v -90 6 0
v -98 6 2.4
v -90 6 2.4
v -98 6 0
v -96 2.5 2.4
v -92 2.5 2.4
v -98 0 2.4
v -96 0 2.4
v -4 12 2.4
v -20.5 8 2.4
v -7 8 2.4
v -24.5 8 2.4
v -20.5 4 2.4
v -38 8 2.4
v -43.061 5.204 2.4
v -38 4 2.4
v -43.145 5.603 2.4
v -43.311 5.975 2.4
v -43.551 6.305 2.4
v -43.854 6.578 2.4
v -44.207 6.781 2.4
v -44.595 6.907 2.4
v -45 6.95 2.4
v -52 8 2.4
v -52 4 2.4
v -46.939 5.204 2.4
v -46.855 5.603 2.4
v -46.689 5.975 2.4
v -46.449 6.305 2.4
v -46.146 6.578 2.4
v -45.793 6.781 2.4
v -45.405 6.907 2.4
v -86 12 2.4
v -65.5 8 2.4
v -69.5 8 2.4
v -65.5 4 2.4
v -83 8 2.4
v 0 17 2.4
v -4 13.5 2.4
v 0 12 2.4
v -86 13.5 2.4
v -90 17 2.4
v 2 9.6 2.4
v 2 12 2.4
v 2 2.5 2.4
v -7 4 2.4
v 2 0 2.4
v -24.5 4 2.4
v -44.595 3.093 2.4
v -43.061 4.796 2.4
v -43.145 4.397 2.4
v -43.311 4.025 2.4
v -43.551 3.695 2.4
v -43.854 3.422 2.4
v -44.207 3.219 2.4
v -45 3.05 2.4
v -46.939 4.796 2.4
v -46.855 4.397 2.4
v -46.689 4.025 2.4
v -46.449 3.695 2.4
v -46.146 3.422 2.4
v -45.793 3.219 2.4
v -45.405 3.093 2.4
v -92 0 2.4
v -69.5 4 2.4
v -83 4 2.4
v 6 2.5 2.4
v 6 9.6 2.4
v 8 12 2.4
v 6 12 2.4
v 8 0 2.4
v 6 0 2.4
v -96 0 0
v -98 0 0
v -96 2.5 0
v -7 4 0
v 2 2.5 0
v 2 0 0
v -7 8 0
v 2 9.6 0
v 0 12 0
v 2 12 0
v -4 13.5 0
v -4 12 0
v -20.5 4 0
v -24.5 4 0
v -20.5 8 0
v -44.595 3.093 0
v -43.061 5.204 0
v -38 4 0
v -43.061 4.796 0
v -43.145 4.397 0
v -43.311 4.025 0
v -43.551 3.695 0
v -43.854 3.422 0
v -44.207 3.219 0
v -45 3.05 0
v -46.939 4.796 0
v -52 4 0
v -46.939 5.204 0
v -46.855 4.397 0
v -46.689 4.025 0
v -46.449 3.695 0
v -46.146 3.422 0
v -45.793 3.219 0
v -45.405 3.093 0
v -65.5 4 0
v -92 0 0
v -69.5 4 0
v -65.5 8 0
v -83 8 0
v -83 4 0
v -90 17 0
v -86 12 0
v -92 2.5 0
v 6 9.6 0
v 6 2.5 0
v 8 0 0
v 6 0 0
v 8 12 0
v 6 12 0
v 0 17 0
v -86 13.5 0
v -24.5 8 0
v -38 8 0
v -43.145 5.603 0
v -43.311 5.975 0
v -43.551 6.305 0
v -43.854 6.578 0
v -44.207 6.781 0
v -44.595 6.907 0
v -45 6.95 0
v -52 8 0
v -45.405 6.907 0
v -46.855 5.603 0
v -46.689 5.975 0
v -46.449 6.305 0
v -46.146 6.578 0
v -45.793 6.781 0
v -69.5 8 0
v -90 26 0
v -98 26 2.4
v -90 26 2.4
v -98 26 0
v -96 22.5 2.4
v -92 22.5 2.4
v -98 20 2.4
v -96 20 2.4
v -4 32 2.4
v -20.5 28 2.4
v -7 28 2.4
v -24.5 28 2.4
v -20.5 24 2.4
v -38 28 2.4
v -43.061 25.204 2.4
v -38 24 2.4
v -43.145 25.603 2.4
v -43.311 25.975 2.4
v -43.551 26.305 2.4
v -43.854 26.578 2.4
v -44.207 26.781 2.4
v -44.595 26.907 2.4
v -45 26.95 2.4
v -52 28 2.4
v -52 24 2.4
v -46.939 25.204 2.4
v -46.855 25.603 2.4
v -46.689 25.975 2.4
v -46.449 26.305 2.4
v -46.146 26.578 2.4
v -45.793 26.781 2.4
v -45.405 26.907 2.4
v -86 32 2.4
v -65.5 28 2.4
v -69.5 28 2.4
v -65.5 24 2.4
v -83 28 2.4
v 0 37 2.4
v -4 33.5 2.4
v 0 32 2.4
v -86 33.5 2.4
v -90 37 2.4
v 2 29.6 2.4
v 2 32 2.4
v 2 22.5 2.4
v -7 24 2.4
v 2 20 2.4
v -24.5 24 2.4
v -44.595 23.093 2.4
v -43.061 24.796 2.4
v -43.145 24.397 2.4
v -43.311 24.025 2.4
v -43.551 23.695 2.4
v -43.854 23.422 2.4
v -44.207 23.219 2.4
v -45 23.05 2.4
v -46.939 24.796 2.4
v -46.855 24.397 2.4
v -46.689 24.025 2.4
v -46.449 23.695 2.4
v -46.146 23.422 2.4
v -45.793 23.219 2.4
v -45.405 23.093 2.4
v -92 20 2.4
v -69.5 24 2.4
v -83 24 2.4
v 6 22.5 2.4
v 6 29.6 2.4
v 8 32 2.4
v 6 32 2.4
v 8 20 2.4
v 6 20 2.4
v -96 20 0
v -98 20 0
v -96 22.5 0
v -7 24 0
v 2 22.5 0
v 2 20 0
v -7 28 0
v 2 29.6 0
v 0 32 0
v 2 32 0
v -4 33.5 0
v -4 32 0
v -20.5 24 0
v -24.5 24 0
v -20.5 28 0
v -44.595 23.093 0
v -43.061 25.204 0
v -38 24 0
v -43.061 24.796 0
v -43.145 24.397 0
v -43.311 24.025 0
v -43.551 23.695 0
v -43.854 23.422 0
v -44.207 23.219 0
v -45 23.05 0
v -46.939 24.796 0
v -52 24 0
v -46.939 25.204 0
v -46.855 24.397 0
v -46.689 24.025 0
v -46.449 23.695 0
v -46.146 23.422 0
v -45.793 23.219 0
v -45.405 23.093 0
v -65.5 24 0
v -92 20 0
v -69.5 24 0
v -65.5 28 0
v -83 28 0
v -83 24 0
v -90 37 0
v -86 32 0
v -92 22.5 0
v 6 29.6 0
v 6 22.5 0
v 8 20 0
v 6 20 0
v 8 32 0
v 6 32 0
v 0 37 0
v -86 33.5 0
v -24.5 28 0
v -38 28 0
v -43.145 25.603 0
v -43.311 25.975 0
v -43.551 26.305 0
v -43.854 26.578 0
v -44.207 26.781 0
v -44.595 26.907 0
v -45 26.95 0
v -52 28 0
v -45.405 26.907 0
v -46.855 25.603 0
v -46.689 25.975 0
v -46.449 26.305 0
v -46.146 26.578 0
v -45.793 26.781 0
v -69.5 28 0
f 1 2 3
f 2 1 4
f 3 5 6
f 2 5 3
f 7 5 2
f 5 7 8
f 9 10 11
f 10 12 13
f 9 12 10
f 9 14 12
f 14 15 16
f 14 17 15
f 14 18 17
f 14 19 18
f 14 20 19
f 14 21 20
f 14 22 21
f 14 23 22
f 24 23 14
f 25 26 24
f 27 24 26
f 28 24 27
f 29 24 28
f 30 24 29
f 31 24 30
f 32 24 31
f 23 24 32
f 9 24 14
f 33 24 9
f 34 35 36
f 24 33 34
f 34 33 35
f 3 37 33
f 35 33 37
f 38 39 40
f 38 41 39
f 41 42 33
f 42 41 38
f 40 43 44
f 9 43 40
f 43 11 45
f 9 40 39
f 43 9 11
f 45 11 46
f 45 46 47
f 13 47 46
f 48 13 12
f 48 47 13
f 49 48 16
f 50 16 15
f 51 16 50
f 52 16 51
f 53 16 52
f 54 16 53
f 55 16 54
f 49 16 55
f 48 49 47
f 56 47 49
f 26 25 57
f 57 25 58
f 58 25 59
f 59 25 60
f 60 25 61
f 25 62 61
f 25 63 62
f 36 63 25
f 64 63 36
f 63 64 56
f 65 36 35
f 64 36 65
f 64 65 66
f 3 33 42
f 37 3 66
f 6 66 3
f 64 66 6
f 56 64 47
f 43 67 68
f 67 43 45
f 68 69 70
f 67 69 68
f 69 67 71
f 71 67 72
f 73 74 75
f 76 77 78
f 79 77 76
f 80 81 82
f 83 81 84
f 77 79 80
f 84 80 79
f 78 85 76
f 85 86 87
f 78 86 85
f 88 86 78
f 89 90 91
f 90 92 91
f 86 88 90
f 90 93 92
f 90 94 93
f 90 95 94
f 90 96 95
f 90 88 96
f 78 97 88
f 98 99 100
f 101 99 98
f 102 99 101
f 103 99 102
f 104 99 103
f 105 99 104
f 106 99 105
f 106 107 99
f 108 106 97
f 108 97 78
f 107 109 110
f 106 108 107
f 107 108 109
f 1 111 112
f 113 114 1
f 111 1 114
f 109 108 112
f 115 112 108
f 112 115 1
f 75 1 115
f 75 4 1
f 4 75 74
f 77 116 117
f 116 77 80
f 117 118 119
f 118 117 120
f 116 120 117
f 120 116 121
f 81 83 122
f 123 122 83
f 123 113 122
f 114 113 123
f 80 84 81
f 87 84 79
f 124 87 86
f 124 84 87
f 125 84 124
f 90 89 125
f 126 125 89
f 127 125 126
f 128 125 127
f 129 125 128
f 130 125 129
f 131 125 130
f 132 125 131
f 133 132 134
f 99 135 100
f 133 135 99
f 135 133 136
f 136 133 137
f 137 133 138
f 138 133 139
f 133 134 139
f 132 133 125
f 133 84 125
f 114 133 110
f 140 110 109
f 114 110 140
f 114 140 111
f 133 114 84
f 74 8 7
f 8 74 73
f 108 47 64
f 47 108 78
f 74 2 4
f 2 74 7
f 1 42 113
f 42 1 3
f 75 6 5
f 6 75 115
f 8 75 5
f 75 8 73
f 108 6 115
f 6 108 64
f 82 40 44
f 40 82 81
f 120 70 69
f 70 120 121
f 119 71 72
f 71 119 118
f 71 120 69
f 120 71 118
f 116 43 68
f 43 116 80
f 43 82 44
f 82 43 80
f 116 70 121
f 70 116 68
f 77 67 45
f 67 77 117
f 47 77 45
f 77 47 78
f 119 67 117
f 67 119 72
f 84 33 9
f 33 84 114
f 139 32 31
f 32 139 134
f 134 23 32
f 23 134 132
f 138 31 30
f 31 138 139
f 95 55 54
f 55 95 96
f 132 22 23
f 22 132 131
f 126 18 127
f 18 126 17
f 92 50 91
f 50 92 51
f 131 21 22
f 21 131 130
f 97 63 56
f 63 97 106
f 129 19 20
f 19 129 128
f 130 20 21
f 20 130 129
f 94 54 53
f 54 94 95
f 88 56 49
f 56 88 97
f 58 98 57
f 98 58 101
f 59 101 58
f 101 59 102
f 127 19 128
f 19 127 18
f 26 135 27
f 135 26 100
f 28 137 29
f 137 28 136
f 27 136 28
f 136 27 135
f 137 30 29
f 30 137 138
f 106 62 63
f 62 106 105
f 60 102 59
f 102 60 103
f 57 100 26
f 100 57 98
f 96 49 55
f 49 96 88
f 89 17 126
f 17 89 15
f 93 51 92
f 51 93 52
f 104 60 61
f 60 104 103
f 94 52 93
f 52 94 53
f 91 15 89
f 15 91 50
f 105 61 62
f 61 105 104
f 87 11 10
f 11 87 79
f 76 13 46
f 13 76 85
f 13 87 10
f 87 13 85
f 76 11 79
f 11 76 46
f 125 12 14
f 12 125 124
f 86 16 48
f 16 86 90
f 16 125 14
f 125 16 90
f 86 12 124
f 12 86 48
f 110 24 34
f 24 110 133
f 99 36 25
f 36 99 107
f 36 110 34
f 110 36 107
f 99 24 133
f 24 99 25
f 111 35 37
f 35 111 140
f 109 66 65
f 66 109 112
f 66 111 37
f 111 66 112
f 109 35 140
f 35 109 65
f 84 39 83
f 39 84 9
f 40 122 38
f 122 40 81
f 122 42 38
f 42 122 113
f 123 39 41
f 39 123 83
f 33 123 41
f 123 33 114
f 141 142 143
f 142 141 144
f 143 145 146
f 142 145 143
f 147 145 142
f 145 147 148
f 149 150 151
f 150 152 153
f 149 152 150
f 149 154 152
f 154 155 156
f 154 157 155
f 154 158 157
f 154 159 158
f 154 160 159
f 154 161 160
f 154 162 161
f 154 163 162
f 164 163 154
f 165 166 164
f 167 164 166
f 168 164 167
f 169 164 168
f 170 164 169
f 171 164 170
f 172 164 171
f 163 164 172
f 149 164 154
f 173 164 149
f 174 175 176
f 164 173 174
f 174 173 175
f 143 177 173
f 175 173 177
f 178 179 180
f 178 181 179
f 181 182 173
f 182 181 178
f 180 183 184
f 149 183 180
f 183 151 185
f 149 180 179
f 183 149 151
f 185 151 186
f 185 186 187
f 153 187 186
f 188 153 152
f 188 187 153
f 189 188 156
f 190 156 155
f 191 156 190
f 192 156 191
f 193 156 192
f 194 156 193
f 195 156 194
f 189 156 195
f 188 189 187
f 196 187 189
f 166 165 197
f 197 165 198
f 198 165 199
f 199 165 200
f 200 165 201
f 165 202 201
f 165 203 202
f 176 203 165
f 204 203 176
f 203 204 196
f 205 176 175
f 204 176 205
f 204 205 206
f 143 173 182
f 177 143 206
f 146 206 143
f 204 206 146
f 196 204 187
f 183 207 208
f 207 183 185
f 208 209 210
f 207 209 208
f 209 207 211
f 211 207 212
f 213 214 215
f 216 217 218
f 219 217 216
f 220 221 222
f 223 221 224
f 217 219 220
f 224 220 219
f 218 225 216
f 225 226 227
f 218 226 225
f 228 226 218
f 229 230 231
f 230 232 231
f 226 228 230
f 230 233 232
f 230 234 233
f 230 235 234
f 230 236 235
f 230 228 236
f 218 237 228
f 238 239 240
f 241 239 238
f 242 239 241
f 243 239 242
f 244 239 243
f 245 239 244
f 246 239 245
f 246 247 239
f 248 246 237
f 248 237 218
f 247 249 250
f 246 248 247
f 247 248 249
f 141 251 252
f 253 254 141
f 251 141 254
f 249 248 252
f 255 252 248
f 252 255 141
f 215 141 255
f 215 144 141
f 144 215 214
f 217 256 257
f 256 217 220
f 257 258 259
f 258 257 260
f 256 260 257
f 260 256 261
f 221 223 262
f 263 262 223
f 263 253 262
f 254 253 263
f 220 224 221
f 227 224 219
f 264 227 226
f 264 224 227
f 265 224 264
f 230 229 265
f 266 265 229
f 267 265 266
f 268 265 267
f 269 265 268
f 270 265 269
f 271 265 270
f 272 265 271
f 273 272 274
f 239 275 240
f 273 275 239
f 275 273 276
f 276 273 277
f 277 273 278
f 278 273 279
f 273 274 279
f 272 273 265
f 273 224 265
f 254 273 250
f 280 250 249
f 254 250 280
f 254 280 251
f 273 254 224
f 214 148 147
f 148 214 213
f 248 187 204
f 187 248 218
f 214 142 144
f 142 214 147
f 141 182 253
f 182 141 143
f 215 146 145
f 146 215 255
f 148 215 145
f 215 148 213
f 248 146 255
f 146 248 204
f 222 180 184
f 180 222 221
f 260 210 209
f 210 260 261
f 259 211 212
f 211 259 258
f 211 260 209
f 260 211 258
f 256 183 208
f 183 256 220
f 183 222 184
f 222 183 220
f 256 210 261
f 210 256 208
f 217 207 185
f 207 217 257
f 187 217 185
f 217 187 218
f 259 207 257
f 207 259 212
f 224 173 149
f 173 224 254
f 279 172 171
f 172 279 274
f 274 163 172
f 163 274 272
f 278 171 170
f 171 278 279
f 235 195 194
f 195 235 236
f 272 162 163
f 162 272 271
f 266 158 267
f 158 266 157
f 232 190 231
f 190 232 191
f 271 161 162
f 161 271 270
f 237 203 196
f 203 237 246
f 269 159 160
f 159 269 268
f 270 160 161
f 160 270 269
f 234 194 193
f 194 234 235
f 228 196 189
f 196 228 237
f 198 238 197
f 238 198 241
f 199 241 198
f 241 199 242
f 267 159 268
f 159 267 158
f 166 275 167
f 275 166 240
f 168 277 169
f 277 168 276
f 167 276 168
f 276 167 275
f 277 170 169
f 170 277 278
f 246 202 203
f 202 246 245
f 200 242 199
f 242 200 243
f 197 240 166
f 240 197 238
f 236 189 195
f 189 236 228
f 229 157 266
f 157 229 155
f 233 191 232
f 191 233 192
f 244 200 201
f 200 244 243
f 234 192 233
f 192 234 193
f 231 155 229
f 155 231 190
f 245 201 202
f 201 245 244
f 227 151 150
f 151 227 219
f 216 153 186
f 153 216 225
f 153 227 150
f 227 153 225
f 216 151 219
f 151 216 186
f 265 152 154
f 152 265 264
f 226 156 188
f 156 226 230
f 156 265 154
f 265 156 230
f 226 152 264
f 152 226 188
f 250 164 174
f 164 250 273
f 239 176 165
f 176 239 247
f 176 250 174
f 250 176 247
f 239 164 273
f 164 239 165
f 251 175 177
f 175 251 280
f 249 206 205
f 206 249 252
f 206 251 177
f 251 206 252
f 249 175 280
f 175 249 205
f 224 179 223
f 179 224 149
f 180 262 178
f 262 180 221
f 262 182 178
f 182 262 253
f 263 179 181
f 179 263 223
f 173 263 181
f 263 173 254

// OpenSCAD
module mount()
{

translate(v=[0,90,0])
  difference()
  {
    cube(size=[6,8,2.4]);

    translate(v=[0,2,0])
      cube(size=[2.5,4,2.4]);

  }

translate(v=[0,-8,0])
  difference()
  {
    cube(size=[12,8,2.4]);

    translate(v=[9.6,2,0])
      cube(size=[2.5,4,2.4]);

    translate(v=[0,2,0])
      cube(size=[2.5,4,2.4]);
  }

difference()
{
  cube(size=[12,90,2.4]);

  /* For the radius below, 2.1 was too large */
  translate(v=[5,45,1.2])
    cylinder(h=2.4,r=1.95,$fs=0.1,center=true);

  /* Holes to reduce the amount of filament used */
  translate(v=[4,7,0])
    cube(size=[4,13.5,2.4]);

  translate(v=[4,24.5,0])
    cube(size=[4,13.5,2.4]);

  translate(v=[4,52,0])
    cube(size=[4,13.5,2.4]);

  translate(v=[4,69.5,0])
    cube(size=[4,13.5,2.4]);
}

translate(v=[12,0,0])
  cube(size=[2.4,4,2.4]);

translate(v=[13.5,0,0])
  cube(size=[3.5,90,2.4]);

translate(v=[12,86,0])
  cube(size=[2.4,4,2.4]);
}

rotate([0,0,90])
  mount();

translate(v=[0,20,0])
rotate([0,0,90])
  mount();
